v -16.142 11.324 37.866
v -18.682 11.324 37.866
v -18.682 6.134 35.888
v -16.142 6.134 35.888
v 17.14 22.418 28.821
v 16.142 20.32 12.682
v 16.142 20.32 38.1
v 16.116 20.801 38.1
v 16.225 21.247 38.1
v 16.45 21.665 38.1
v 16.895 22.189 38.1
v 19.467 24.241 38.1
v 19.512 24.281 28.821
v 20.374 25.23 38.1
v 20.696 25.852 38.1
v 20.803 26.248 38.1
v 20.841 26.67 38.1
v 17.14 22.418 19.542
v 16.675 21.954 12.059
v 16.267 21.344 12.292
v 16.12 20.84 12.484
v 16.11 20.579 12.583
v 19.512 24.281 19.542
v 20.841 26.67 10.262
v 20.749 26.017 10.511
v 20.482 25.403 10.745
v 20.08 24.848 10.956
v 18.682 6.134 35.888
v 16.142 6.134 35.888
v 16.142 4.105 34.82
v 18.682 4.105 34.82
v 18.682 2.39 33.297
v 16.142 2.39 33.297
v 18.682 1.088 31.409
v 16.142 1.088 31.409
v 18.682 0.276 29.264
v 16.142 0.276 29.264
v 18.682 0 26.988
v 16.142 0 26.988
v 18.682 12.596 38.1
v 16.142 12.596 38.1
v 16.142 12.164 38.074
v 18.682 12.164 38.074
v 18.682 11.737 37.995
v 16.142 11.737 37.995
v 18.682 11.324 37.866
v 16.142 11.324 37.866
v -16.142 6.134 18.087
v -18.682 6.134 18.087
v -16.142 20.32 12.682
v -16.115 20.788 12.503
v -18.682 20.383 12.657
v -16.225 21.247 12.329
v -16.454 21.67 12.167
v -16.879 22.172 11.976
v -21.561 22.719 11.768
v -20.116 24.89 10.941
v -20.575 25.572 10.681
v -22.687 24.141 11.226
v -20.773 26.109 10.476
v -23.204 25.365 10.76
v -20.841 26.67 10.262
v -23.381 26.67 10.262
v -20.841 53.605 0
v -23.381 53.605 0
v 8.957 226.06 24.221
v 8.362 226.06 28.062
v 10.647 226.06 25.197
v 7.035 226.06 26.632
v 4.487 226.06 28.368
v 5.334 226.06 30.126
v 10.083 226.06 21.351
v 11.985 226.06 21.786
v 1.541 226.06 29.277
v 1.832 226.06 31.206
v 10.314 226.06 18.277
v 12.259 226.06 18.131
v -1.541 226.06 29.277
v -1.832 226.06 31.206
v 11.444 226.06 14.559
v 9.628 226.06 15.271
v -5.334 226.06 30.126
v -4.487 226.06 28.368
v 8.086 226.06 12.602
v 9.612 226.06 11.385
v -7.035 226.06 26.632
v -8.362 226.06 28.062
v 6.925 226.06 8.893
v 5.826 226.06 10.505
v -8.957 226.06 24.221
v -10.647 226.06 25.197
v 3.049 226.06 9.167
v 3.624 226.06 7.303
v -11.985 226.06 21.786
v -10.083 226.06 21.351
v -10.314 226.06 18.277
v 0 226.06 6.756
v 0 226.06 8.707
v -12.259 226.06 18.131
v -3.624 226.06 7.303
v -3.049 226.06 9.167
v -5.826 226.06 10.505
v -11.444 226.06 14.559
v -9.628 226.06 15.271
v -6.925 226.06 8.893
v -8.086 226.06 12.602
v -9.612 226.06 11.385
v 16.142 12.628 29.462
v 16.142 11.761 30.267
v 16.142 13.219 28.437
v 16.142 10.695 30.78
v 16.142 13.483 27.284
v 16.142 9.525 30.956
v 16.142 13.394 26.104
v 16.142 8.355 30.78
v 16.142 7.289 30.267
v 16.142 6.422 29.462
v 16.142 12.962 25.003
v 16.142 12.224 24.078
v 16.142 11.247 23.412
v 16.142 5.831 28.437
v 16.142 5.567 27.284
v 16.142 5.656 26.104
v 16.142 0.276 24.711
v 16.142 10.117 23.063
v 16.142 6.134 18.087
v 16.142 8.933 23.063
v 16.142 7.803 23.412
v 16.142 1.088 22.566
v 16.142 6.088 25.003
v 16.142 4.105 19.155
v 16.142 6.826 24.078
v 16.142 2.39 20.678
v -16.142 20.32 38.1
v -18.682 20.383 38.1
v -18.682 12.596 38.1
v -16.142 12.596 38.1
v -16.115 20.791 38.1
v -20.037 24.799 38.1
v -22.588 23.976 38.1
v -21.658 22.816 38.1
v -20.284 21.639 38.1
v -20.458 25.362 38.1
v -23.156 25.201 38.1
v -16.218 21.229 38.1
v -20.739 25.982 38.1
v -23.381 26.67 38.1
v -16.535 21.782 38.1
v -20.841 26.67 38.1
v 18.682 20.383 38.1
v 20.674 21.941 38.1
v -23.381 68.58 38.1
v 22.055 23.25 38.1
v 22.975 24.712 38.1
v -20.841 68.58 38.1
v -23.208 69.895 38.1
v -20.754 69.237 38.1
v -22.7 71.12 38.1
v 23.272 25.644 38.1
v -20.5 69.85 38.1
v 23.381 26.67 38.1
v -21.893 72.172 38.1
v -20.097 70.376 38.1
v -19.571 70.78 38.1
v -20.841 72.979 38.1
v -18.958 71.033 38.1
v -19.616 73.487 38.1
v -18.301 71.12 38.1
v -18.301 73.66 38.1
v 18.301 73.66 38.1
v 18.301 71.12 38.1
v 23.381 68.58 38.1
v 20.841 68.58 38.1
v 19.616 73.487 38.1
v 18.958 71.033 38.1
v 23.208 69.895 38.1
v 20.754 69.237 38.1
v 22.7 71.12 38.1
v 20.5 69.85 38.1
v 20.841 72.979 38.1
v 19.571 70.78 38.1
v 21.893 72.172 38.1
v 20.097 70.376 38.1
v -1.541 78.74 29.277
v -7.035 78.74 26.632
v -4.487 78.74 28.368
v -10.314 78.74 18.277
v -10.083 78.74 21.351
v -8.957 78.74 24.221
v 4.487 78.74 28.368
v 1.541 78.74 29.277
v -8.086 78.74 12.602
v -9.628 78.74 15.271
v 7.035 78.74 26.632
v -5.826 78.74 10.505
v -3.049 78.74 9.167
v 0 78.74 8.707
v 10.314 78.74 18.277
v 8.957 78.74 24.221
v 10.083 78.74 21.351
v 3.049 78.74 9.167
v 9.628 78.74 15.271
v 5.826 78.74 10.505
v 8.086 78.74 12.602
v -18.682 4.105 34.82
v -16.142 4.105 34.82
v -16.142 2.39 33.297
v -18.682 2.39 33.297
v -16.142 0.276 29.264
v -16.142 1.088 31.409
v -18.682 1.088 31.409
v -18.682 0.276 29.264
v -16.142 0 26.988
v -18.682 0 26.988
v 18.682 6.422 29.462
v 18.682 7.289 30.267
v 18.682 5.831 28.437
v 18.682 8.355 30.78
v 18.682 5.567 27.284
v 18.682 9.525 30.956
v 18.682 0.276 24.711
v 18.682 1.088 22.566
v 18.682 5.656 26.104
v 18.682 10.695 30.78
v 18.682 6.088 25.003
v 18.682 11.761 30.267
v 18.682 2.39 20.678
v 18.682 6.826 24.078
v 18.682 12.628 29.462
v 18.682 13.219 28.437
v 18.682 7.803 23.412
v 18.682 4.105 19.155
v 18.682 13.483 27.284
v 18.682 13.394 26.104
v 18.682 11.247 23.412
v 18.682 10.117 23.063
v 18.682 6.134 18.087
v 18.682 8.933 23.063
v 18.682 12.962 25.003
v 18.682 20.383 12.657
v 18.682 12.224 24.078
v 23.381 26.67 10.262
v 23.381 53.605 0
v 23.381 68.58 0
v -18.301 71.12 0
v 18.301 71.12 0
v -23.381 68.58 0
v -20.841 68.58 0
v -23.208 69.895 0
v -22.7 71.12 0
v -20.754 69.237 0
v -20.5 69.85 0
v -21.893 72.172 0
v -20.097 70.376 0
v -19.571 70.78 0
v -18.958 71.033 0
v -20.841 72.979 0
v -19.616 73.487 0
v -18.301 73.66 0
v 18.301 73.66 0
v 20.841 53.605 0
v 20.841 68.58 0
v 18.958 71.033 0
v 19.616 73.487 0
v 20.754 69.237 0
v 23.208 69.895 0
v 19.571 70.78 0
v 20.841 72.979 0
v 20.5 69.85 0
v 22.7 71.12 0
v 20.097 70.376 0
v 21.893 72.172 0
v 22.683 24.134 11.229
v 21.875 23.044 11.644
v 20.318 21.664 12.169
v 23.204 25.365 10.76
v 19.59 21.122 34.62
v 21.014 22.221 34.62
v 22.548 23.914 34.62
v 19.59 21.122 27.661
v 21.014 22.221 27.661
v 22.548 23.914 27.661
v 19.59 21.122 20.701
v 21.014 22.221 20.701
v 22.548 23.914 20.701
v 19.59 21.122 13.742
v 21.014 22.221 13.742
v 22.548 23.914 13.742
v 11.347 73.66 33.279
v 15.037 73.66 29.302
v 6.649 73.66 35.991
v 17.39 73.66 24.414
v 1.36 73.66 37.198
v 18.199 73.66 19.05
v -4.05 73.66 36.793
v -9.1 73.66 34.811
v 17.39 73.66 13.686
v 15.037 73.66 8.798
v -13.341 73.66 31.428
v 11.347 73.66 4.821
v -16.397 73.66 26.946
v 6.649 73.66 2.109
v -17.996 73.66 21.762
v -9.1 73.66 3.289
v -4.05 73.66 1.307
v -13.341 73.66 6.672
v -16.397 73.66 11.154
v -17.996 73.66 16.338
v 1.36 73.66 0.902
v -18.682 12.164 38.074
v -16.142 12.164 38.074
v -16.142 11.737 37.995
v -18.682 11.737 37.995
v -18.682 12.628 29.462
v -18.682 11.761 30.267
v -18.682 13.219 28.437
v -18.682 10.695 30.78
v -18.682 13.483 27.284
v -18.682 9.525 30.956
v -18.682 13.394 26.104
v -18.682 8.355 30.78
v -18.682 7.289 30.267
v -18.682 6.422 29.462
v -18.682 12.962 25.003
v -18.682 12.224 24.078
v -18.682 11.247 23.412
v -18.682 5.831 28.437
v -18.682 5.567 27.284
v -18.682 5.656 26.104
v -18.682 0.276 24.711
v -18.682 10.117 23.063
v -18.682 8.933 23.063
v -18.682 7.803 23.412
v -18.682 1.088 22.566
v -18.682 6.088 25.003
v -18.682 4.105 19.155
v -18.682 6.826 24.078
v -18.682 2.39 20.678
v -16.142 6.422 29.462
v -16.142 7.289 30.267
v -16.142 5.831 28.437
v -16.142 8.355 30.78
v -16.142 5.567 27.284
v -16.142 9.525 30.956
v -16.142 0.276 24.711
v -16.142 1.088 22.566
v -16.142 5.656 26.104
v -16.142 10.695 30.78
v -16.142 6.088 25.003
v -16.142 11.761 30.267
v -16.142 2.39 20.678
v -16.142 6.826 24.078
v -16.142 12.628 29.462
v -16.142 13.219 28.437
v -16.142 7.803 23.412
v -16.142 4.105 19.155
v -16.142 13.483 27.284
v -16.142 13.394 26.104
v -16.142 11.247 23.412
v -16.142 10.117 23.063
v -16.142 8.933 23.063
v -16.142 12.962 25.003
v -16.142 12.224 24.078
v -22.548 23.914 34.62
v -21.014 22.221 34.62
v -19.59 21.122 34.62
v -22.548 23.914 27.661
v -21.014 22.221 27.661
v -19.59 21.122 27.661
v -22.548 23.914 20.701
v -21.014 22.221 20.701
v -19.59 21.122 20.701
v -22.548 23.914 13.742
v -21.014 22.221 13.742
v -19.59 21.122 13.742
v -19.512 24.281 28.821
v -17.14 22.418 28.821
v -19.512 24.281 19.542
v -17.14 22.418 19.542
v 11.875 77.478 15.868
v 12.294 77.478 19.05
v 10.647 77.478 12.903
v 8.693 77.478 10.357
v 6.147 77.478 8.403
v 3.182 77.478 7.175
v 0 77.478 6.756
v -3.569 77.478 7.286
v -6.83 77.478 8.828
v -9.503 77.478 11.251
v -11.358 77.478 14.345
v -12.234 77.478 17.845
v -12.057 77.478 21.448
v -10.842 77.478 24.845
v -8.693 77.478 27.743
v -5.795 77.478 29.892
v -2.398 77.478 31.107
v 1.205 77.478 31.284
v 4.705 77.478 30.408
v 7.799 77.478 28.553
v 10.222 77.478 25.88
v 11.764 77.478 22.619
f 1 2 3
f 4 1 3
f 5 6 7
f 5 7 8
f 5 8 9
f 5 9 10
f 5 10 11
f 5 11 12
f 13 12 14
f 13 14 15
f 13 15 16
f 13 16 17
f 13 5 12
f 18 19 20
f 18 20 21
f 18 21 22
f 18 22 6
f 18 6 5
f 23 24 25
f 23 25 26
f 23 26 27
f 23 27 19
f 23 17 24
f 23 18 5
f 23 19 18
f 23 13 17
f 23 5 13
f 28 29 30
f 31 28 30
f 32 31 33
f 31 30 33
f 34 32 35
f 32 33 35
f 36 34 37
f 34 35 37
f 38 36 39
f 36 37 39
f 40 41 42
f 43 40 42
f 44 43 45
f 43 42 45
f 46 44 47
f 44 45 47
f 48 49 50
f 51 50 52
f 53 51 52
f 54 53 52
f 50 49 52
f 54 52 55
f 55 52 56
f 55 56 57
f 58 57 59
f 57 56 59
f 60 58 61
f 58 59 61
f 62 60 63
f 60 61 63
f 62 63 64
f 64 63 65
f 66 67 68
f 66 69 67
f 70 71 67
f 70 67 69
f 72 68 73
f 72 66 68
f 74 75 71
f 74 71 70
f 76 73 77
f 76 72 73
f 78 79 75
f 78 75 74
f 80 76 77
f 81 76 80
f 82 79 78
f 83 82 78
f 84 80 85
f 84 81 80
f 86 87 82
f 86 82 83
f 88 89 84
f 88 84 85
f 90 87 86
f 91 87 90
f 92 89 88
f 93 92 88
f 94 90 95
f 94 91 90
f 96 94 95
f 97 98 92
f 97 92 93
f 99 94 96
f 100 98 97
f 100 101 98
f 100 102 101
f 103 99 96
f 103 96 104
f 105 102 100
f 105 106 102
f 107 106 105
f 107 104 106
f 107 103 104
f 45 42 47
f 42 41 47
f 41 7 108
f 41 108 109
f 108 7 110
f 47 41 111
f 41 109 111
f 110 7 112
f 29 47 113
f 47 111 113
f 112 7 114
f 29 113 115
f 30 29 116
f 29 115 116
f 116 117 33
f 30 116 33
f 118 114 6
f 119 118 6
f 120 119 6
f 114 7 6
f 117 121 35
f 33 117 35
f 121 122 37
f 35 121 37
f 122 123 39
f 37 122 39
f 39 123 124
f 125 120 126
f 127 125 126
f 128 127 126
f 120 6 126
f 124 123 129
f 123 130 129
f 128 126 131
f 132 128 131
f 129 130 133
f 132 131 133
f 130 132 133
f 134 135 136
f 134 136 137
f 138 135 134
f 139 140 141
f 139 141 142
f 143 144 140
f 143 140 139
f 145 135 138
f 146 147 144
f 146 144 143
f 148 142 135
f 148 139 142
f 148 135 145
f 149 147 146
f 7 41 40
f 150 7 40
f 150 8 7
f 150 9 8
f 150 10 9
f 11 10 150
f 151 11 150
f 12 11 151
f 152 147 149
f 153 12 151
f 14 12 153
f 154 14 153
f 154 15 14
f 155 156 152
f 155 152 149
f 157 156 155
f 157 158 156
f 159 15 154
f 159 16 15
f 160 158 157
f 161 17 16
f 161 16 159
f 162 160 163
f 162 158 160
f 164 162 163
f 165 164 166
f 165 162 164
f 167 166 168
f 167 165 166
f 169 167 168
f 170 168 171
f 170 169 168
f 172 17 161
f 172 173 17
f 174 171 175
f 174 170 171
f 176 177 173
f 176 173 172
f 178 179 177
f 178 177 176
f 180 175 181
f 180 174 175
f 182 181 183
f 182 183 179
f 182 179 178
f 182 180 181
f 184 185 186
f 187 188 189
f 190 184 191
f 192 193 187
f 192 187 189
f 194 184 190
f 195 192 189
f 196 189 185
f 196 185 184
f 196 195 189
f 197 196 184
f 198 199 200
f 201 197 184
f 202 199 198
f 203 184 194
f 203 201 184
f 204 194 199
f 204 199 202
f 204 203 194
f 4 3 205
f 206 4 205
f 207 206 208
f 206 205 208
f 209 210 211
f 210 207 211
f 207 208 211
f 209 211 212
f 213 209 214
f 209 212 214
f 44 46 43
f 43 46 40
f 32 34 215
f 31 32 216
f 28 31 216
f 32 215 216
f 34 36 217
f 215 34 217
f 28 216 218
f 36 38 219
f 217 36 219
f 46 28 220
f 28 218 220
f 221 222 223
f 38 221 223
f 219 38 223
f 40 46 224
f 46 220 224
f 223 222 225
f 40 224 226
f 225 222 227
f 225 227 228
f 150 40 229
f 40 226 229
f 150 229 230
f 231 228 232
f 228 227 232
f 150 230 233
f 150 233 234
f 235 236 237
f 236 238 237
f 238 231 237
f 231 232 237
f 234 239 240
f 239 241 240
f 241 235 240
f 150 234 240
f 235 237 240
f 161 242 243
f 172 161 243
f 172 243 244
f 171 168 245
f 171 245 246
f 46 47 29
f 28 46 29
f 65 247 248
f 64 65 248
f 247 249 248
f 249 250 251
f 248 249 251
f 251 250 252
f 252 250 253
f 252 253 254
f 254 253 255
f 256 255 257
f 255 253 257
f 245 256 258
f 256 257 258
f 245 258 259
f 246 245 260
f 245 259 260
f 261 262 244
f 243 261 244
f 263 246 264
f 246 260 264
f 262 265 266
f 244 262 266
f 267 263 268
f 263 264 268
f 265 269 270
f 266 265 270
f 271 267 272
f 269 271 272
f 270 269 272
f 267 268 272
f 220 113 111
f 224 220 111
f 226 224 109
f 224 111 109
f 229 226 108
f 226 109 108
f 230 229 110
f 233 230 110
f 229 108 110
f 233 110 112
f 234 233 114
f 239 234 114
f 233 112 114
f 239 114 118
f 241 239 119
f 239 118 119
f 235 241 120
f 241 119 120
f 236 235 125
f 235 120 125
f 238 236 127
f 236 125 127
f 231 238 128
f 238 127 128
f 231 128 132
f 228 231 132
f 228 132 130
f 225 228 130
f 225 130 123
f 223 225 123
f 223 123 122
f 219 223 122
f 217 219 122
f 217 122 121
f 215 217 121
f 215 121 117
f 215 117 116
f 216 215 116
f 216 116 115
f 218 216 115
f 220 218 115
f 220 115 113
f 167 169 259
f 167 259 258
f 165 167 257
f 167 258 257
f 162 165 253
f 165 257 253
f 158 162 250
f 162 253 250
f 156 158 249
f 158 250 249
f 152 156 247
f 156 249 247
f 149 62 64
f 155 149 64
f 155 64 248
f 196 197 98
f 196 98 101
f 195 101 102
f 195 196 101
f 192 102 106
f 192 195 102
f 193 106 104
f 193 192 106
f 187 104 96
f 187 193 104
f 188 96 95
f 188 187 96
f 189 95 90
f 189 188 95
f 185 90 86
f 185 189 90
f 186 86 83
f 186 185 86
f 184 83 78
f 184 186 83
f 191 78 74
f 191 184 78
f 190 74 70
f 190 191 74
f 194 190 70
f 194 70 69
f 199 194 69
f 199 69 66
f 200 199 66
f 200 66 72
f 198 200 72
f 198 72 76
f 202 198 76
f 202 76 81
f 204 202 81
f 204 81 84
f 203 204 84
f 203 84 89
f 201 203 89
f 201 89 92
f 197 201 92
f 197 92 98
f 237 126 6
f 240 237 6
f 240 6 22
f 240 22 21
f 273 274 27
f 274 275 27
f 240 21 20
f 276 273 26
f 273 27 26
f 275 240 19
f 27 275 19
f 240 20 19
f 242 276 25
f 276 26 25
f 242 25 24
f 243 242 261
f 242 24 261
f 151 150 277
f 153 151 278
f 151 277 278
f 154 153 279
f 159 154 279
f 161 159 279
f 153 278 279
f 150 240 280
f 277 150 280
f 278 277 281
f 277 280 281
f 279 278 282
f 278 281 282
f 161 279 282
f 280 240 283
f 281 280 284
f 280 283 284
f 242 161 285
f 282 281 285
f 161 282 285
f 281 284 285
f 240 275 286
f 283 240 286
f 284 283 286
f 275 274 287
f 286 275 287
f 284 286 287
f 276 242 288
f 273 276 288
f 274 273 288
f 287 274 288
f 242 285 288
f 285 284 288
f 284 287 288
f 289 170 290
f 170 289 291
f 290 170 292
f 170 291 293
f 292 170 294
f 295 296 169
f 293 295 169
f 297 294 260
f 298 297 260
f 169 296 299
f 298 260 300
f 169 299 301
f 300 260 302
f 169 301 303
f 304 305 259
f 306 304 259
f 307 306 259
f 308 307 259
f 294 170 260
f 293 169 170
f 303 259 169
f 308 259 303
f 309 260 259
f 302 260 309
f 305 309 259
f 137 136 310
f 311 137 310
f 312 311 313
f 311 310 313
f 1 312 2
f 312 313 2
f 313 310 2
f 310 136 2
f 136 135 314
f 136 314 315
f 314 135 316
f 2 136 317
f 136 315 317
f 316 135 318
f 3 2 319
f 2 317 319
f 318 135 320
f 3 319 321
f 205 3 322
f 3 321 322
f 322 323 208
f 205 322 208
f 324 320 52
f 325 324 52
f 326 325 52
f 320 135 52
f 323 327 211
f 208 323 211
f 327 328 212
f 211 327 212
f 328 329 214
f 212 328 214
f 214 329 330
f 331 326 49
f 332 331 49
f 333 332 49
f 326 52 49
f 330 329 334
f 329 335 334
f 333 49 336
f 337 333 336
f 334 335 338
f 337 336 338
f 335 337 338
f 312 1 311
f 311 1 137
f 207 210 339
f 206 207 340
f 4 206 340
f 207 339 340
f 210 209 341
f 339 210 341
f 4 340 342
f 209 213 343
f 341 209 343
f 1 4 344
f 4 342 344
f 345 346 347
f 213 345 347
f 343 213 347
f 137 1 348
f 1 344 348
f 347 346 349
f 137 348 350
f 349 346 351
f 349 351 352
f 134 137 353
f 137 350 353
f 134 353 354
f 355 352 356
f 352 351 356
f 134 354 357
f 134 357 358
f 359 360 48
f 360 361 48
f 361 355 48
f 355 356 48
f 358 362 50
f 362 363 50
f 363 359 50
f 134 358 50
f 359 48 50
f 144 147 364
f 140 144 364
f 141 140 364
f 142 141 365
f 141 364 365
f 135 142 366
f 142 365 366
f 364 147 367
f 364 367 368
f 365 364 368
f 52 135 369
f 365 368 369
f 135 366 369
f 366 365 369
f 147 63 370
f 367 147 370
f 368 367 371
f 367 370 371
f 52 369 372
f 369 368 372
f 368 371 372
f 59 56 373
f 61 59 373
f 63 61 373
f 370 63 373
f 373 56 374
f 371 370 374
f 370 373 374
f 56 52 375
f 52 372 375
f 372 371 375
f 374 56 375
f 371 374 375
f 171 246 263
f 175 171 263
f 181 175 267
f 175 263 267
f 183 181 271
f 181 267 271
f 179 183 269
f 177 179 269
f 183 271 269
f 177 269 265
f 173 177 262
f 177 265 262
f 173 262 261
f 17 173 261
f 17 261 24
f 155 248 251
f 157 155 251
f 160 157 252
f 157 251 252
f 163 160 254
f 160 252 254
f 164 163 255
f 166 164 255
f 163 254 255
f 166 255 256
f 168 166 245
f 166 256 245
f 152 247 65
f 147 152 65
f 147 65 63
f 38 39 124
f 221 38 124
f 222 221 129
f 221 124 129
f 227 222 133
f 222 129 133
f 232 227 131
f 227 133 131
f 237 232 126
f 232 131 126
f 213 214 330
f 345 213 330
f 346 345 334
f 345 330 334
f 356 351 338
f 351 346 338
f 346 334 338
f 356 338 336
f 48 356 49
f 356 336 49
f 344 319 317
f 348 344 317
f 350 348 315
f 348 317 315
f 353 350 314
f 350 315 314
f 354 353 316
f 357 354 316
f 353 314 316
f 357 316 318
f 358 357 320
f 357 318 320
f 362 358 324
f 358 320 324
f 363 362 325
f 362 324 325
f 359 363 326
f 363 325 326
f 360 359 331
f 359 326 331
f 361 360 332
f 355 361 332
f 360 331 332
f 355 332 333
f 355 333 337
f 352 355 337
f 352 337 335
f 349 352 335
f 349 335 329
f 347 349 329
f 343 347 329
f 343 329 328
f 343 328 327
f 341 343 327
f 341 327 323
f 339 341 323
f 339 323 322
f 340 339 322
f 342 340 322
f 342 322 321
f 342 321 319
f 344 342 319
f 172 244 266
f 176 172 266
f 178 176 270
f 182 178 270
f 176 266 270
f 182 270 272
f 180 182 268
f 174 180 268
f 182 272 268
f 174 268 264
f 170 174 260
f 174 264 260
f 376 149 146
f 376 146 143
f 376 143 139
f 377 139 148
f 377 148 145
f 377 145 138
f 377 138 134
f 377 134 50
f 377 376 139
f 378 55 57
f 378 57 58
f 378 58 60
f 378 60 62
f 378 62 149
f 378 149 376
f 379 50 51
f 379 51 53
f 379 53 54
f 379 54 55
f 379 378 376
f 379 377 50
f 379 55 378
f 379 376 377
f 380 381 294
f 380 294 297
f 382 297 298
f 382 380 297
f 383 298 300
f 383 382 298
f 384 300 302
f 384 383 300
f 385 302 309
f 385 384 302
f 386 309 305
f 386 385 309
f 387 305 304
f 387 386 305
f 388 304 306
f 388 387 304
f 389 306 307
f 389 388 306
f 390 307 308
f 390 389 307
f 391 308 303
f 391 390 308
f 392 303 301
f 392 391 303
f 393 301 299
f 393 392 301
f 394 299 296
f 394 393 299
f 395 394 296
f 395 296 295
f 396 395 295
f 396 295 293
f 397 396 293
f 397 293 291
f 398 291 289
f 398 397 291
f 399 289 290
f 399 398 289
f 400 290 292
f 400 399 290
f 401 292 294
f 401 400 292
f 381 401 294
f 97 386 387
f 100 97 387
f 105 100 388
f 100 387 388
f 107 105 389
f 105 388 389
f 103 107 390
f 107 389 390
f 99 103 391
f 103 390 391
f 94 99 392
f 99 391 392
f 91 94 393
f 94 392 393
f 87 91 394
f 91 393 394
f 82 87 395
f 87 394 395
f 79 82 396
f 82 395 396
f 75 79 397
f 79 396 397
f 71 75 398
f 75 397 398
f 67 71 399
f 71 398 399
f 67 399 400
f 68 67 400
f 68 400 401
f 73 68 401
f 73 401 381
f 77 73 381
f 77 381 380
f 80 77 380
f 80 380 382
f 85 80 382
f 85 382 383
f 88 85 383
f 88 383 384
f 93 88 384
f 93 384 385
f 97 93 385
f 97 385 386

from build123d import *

# Parameters (mm, degrees)
EXTRUDE_THIN1_DEPTH = 38.1
CUT_EXTRUDE1_DEPTH  = 96.205221294
SKETCH5_R           = 3.96875
CUT_EXTRUDE2_DEPTH  = 96.205221294
SKETCH6_R           = 12.2936
SKETCH6_R_2         = 10.342534733
BOSS_EXTRUDE2_DEPTH = 152.4
SKETCH8_R           = 18.199007784
SKETCH7_R           = 10.342534733


# Read off the part's stored shape, not the designer's step: Extrude-Thin1
with BuildPart() as part:
    # Extrude-Thin1 outline → Extrude-Thin1 (new body)
    with BuildSketch(Plane.XY):
        with BuildLine():
            Line((-18.6817, 20.38347688), (-18.6817, 0))
            Line((-18.6817, 0), (-16.1417, 0))
            Line((-16.1417, 0), (-16.1417, 20.32))
            add(Edge.make_bspline(
                [(-20.8407, 26.67), (-20.8407, 23.763857752), (-15.646351535, 22.789211476), (-16.1417, 20.32)],
                knots=[0, 0, 0, 0, 1, 1, 1, 1], degree=3))
            Line((-20.8407, 26.67), (-20.8407, 68.58))
            ThreePointArc((-20.8407, 68.58), (-20.096751224, 70.376051224), (-18.3007, 71.12))
            Line((-18.3007, 71.12), (18.3007, 71.12))
            ThreePointArc((18.3007, 71.12), (20.096751224, 70.376051224), (20.8407, 68.58))
            Line((20.8407, 68.58), (20.8407, 26.67))
            add(Edge.make_bspline(
                [(16.1417, 20.32), (15.646351535, 22.789211476), (20.8407, 23.763857752), (20.8407, 26.67)],
                knots=[0, 0, 0, 0, 1, 1, 1, 1], degree=3))
            Line((16.1417, 20.32), (16.1417, 0))
            Line((16.1417, 0), (18.6817, 0))
            Line((18.6817, 0), (18.6817, 20.38347688))
            add(Edge.make_bspline(
                [(18.6817, 20.38347688), (18.765268898, 20.466690468), (18.888895007, 20.57668849), (19.198318415, 20.827254502), (19.383759179, 20.968114578), (19.796479851, 21.275209729), (20.023736725, 21.441568971), (20.503556211, 21.804901686), (20.7562224, 22.001844549), (21.272496014, 22.440788491), (21.53645688, 22.68275476), (22.056971887, 23.237206576), (22.314275473, 23.550298766), (22.782632726, 24.278317238), (22.993321794, 24.695356067), (23.294062312, 25.62890672), (23.3807, 26.144600529), (23.3807, 26.67)],
                knots=[0, 0, 0, 0, 0.125, 0.125, 0.25, 0.25, 0.375, 0.375, 0.5, 0.5, 0.625, 0.625, 0.75, 0.75, 0.875, 0.875, 1, 1, 1, 1], degree=3))
            Line((23.3807, 26.67), (23.3807, 68.58))
            ThreePointArc((23.3807, 68.58), (21.892802448, 72.172102448), (18.3007, 73.66))
            Line((18.3007, 73.66), (-18.3007, 73.66))
            ThreePointArc((-18.3007, 73.66), (-21.892802448, 72.172102448), (-23.3807, 68.58))
            Line((-23.3807, 68.58), (-23.3807, 26.67))
            add(Edge.make_bspline(
                [(-23.3807, 26.67), (-23.3807, 26.144600529), (-23.294062312, 25.62890672), (-22.993321794, 24.695356067), (-22.782632726, 24.278317238), (-22.314275473, 23.550298766), (-22.056971887, 23.237206576), (-21.53645688, 22.68275476), (-21.272496014, 22.440788491), (-20.7562224, 22.001844549), (-20.503556211, 21.804901686), (-20.023736725, 21.441568971), (-19.796479851, 21.275209729), (-19.383759179, 20.968114578), (-19.198318415, 20.827254502), (-18.888895007, 20.57668849), (-18.765268898, 20.466690468), (-18.6817, 20.38347688)],
                knots=[0, 0, 0, 0, 0.125, 0.125, 0.25, 0.25, 0.375, 0.375, 0.5, 0.5, 0.625, 0.625, 0.75, 0.75, 0.875, 0.875, 1, 1, 1, 1], degree=3))
        make_face()
    extrude(amount=EXTRUDE_THIN1_DEPTH)

    # Sketch3 → Cut-Extrude1 (cut, through all)
    with BuildSketch(Plane.ZY.offset(23.3807)):
        with BuildLine():
            Line((18.086653696, 6.133752432), (0, 53.604932722))
            Line((0, 53.604932722), (0, 0))
            Line((0, 0), (26.9875, 0))
            ThreePointArc((26.9875, 0), (21.582687704, 1.681937521), (18.086653696, 6.133752432))
        make_face()
        with BuildLine():
            ThreePointArc((35.888346304, 6.133752432), (32.392312296, 1.681937521), (26.9875, 0))
            Line((26.9875, 0), (38.1, 0))
            Line((38.1, 0), (38.1, 12.596443014))
            ThreePointArc((38.1, 12.596443014), (38.040956068, 11.949441708), (37.865774898, 11.323815275))
            Line((37.865774898, 11.323815275), (35.888346304, 6.133752432))
        make_face()
    extrude(amount=-CUT_EXTRUDE1_DEPTH, mode=Mode.SUBTRACT)

    # Sketch5 → Cut-Extrude2 (cut, through all)
    with BuildSketch(Plane.ZY.offset(23.3807)):
        with Locations((26.9875, 9.525)):
            Circle(SKETCH5_R)
    extrude(amount=-CUT_EXTRUDE2_DEPTH, mode=Mode.SUBTRACT)

    # Sketch6 → Boss-Extrude2 (add)
    with BuildSketch(Plane(origin=(0, 73.66, 0), x_dir=(1, 0, 0), z_dir=(0, 1, 0))):
        with Locations(Location((0, -19.05, 0), (0, 0, 90))):
            Circle(SKETCH6_R)
        with Locations(Location((0, -19.05, 0), (0, 0, 90))):
            Circle(SKETCH6_R_2, mode=Mode.SUBTRACT)
    extrude(amount=BOSS_EXTRUDE2_DEPTH)

    # Sketch8 → Loft2 section 0
    with BuildSketch(Plane(origin=(0, 73.66, 0), x_dir=(1, 0, 0), z_dir=(0, 1, 0))):
        with Locations((0, -19.05)):
            Circle(SKETCH8_R)
    # Sketch7 → Loft2 section 1
    with BuildSketch(Plane(origin=(0, 78.74, 0), x_dir=(1, 0, 0), z_dir=(0, 1, 0))):
        with Locations((0, -19.05)):
            Circle(SKETCH7_R)
    loft()


solid = part.part
